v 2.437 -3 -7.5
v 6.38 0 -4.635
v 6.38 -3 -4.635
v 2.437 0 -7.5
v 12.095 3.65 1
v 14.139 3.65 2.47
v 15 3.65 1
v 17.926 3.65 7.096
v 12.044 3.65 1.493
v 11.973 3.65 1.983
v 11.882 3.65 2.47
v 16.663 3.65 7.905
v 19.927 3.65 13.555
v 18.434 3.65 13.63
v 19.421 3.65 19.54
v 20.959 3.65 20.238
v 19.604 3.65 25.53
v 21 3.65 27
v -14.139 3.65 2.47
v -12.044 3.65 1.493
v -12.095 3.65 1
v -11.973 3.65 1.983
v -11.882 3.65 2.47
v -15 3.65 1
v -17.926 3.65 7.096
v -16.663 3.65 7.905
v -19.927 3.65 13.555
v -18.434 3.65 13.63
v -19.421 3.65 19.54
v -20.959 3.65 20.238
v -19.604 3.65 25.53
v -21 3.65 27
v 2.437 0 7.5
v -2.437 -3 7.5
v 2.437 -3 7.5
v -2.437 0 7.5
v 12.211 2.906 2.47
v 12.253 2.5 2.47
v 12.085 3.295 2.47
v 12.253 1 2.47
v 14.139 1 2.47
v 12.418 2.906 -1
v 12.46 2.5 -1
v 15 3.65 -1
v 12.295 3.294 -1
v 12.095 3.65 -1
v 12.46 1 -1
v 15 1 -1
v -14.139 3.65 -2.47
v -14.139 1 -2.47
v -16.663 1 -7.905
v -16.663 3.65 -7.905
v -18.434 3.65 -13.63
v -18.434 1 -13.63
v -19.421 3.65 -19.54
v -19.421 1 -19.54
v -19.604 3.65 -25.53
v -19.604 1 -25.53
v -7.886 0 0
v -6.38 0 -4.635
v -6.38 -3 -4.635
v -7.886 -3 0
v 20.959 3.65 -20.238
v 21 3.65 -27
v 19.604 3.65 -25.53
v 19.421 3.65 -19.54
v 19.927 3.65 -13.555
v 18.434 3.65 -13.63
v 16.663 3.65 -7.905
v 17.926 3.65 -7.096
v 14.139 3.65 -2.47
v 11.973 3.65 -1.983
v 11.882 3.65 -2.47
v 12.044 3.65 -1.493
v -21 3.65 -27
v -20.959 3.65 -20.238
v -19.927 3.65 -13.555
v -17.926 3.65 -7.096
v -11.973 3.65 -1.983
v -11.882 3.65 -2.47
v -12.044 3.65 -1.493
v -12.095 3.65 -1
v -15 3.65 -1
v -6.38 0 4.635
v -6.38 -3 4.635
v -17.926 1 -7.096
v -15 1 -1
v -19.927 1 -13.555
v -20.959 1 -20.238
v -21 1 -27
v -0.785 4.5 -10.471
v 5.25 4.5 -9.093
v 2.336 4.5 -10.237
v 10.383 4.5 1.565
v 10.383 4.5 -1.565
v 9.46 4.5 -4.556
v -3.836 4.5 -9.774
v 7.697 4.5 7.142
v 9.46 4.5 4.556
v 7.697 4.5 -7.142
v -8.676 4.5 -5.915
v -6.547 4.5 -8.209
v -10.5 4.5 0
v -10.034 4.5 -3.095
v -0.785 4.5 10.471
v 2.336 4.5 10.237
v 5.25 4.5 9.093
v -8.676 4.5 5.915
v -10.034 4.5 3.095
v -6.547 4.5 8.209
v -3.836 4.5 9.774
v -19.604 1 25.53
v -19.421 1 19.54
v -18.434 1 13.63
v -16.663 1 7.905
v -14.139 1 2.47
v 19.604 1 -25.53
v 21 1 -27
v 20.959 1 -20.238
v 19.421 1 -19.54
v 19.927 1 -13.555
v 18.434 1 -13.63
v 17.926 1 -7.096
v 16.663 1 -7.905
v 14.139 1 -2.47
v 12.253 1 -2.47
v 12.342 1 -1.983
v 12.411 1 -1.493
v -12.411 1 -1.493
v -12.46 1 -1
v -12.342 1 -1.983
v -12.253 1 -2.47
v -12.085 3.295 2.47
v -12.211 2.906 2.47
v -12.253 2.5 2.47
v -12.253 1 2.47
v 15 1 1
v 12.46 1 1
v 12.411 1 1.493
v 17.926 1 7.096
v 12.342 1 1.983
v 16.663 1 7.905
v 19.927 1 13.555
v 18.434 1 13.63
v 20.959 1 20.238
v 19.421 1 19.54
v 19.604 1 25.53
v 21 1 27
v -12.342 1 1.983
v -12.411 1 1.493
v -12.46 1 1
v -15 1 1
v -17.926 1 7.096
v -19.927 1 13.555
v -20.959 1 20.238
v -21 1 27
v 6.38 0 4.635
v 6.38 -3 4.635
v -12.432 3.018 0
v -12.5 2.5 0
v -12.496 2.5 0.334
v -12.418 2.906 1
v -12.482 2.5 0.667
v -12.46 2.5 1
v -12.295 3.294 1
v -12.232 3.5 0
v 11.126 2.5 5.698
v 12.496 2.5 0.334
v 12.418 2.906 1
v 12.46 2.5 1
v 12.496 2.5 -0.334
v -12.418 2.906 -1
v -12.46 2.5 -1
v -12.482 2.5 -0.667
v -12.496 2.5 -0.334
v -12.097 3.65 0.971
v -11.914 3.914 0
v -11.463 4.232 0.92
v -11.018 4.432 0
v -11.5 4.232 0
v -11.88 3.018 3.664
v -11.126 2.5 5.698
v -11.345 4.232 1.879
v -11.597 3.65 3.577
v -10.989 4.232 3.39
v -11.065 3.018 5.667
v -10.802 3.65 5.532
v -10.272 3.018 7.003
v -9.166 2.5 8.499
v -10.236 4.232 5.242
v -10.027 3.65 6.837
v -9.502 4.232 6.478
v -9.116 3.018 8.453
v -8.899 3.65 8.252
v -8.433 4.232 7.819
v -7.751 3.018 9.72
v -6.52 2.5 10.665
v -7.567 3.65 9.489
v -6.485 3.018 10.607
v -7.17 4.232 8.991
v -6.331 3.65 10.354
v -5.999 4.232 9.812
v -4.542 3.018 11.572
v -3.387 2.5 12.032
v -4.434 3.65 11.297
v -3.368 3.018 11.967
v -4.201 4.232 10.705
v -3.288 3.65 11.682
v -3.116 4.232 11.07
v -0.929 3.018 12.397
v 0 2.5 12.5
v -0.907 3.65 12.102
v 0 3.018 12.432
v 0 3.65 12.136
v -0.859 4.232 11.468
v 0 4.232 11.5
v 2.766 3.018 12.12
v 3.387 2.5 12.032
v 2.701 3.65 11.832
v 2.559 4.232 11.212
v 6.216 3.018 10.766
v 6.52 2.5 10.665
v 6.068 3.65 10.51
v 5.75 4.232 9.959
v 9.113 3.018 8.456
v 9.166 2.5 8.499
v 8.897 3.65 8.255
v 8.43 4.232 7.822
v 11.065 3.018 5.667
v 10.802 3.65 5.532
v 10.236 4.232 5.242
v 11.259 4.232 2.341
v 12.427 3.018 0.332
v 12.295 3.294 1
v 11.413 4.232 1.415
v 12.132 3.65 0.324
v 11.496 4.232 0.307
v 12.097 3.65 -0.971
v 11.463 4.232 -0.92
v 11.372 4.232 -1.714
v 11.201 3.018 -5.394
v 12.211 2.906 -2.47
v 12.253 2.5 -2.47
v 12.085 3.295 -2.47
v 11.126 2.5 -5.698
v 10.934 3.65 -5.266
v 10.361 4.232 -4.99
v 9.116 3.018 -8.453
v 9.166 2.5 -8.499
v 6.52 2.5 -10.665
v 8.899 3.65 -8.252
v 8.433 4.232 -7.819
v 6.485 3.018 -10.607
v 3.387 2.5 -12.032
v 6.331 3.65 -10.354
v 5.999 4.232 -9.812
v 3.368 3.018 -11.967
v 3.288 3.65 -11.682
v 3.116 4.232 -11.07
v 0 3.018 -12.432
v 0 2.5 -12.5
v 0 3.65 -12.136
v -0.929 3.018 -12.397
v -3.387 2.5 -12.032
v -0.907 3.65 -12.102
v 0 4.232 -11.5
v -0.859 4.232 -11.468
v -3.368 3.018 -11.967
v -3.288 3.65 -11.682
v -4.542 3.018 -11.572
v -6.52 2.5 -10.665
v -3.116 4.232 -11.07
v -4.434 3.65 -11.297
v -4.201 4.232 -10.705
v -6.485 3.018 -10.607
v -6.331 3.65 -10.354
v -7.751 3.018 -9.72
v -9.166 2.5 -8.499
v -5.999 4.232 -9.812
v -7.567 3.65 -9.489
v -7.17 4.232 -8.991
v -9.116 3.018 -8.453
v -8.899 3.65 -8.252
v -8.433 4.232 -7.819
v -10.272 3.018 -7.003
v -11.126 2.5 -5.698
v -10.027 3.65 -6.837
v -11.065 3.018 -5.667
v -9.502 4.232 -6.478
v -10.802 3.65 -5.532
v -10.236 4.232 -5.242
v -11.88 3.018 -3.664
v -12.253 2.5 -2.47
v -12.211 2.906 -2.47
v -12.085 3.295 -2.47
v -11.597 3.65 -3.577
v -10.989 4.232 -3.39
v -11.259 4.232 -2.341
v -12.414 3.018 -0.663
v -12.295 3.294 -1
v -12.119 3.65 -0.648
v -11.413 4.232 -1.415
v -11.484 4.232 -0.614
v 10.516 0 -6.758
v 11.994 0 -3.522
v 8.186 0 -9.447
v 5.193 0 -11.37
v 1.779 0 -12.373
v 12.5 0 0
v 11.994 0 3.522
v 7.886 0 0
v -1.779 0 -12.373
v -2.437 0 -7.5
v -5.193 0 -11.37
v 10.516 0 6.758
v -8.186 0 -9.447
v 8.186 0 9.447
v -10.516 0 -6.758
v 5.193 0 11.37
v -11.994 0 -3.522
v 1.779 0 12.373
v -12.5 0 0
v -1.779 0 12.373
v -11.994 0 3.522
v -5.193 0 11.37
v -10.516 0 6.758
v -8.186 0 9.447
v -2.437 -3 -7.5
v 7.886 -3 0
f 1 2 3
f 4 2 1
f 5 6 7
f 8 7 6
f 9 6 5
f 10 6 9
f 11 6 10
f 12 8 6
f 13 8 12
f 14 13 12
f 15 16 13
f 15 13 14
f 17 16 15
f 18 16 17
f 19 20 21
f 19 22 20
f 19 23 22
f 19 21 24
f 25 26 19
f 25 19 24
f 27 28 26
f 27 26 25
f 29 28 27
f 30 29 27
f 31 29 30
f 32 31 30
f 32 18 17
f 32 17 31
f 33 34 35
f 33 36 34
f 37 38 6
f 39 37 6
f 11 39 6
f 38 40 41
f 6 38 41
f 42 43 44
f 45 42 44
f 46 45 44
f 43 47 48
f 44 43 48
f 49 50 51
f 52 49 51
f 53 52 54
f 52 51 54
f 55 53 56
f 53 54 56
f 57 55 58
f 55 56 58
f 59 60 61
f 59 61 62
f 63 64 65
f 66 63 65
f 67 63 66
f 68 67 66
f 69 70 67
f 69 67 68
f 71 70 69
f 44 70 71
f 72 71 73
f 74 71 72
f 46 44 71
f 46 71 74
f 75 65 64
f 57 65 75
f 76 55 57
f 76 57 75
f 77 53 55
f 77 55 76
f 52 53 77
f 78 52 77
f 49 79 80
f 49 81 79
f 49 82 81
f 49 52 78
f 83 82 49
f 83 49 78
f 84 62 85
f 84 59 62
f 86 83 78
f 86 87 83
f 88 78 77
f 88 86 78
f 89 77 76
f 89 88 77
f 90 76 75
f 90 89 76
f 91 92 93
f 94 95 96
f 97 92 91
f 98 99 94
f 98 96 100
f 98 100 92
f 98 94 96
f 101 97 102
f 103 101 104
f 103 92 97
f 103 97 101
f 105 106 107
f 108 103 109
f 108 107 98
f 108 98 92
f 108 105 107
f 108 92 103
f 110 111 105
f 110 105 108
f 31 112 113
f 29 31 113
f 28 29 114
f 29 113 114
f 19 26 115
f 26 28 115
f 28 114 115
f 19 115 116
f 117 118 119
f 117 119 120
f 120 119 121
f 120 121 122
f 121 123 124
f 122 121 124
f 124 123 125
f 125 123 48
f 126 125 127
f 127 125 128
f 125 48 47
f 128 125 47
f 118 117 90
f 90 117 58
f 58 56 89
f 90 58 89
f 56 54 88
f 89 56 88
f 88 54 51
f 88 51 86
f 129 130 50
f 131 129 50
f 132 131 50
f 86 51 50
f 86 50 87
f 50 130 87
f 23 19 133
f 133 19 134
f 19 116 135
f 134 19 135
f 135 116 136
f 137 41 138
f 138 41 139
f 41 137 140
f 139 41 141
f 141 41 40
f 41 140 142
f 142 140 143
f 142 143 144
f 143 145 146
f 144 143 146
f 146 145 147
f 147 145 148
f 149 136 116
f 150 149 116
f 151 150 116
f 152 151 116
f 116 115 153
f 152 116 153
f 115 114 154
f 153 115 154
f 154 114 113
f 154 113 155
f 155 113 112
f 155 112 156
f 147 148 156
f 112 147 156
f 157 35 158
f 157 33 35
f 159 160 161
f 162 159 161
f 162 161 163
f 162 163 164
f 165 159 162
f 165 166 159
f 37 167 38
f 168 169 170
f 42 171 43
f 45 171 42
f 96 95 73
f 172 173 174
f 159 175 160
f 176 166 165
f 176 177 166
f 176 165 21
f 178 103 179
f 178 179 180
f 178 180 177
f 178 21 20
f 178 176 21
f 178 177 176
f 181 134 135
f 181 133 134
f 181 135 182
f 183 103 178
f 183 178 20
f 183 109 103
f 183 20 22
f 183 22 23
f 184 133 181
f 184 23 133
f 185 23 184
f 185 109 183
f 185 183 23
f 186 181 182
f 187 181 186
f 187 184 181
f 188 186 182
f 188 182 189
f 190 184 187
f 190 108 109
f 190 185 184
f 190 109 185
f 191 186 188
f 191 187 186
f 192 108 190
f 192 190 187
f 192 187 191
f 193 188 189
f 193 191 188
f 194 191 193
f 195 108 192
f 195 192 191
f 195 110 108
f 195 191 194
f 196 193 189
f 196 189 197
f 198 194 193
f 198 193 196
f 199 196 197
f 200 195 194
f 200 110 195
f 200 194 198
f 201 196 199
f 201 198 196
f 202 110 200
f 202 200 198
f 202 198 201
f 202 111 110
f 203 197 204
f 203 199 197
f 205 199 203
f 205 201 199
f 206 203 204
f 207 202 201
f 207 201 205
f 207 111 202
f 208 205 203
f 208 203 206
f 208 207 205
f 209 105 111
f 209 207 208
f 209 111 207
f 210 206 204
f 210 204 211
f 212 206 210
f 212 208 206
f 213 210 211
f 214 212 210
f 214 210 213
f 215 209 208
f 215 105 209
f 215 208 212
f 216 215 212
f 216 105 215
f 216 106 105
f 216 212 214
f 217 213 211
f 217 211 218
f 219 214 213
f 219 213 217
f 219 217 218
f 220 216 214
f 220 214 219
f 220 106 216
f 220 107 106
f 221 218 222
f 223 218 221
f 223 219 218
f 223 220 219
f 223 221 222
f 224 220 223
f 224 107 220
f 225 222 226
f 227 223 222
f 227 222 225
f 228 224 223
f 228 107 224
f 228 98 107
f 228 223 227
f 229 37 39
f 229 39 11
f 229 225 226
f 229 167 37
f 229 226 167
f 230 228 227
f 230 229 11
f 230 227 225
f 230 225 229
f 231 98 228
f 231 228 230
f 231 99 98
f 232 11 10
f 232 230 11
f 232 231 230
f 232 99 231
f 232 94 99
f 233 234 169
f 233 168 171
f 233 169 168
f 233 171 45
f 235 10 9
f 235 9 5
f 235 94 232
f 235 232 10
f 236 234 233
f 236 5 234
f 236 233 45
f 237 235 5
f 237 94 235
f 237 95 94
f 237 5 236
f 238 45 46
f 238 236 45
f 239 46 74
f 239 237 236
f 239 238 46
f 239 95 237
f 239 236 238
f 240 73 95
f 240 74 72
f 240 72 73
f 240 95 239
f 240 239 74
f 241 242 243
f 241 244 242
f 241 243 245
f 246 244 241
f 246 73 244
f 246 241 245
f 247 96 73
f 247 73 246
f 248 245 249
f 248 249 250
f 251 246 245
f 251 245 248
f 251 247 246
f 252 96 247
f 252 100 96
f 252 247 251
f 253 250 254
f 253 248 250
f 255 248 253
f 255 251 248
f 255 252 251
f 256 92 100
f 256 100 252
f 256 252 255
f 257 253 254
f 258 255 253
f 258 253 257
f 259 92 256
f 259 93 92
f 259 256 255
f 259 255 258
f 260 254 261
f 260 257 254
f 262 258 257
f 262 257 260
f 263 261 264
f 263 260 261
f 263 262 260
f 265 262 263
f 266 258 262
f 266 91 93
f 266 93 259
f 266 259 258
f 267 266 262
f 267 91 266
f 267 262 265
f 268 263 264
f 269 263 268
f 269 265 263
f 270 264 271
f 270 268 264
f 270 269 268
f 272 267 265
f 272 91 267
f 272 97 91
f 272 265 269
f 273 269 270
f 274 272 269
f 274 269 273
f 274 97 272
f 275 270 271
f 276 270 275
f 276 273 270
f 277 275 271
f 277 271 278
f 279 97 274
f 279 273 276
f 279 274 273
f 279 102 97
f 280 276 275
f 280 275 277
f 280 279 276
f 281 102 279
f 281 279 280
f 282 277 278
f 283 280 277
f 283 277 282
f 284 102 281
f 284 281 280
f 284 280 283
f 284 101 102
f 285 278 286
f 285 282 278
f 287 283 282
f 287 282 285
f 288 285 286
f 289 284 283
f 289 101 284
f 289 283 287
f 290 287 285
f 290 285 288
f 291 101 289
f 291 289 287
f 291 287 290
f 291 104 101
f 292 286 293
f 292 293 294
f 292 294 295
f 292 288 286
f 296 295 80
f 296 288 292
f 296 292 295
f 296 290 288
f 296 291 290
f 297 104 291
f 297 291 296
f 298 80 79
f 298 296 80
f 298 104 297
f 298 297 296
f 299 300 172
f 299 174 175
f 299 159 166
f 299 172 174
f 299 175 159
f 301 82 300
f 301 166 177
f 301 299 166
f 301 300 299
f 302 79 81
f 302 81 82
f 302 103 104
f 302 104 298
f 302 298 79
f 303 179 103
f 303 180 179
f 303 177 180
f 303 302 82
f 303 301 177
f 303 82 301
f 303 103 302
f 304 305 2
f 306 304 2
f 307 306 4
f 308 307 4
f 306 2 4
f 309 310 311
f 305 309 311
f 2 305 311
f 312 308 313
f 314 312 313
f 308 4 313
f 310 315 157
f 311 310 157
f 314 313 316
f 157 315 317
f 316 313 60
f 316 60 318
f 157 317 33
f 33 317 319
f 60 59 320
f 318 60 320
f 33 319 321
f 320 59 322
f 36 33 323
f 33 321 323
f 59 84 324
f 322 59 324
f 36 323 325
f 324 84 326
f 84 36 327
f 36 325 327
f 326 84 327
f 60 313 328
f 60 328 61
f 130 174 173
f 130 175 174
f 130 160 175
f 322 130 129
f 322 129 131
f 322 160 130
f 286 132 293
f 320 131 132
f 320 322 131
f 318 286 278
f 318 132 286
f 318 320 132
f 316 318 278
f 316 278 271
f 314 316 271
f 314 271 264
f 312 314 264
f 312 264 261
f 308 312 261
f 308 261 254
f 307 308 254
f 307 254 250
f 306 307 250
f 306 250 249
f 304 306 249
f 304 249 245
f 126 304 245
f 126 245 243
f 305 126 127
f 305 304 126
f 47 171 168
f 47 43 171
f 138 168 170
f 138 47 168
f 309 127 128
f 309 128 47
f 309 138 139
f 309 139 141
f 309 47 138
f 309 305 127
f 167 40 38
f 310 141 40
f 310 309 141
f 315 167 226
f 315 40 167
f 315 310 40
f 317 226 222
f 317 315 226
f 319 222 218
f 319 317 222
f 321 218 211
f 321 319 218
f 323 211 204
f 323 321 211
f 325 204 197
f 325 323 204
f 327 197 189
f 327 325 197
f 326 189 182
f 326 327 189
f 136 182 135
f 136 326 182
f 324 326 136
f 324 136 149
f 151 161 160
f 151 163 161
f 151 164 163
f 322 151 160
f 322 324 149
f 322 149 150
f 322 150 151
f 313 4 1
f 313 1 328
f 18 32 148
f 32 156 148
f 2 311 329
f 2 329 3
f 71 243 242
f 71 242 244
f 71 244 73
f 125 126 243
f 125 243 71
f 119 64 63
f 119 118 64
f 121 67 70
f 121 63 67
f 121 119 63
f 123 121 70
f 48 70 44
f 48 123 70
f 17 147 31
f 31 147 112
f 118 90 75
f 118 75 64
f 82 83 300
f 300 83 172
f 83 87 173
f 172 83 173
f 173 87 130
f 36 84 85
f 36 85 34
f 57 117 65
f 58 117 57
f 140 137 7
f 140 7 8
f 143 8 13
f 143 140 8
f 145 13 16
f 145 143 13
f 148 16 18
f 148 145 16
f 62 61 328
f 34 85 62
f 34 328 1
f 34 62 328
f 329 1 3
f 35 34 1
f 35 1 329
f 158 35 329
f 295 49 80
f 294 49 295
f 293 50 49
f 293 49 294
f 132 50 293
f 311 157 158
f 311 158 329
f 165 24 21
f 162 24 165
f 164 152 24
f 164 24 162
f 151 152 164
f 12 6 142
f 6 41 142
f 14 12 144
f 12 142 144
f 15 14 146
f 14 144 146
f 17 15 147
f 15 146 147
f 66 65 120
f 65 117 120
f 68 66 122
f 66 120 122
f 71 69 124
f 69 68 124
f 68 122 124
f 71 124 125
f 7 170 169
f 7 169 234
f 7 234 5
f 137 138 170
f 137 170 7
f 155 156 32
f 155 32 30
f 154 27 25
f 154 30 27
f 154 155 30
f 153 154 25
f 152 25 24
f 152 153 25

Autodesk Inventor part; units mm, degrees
ref_plane "YZ Plane" through (0, 0, 0) normal (1, 0, 0) x (0, 1, 0)
ref_plane "XY Plane" through (0, 0, 0) normal (0, 0, 1) x (1, 0, 0)
sketch "Sketch1" plane through (0, 0, 0) normal (0, 1, 0) x (-1, 0, 0)
  circle A0 centre (0, 0) radius 12.5
  dimension "d0" = 25
extrude "Extrusion1" add sketch "Sketch1" along normal blind 4.5
ref_plane "Work Plane1" through (0, 1, 0) normal (0, 1, 0) x (-1, 0, 0)
sketch "Sketch2" plane through (0, 1, 0) normal (0, 1, 0) x (-1, 0, 0)
  line L0 (15, -1) -> (-15, -1)
  arc A0 (21, -27) -> (15, -1) centre (-24.8954, -23.8989) ccw
  line L1 (21, -27) -> (-21, -27)
  arc A1 (-15, -1) -> (-21, -27) centre (24.8954, -23.8989) ccw
  line L2 (-19.6045, -25.5298) -> (19.6045, -25.5298)
  arc A2 (19.6045, -25.5298) -> (14.1394, -2.4702) centre (-24.8954, -23.8989) ccw
  line L3 (14.1394, -2.4702) -> (-14.1394, -2.4702)
  arc A3 (-14.1394, -2.4702) -> (-19.6045, -25.5298) centre (24.8954, -23.8989) ccw
  line L4 (31.9342, 0) -> (-23.3502, 0) construction
  line L5 (15, 1) -> (-15, 1)
  arc A4 (15, 1) -> (21, 27) centre (-24.8954, 23.8989) ccw
  line L6 (21, 27) -> (-21, 27)
  arc A5 (-21, 27) -> (-15, 1) centre (24.8954, 23.8989) ccw
  line L7 (-19.6045, 25.5298) -> (19.6045, 25.5298)
  arc A6 (14.1394, 2.4702) -> (19.6045, 25.5298) centre (-24.8954, 23.8989) ccw
  line L8 (14.1394, 2.4702) -> (-14.1394, 2.4702)
  arc A7 (-19.6045, 25.5298) -> (-14.1394, 2.4702) centre (24.8954, 23.8989) ccw
  point P0 (0, 0)
  point P1 (0, -1)
  point P2 (0, -27)
  point P3 (0, 1)
  point P4 (0, 27)
  dimension "d4" = 1
  dimension "d5" = 30
  dimension "d6" = 26
  dimension "d7" = 42
  dimension "d8" = 46
  dimension "d9" = 46
extrude "Extrusion2" add sketch "Sketch2" along normal blind 2.65
fillet "Fillet1" radius 2 1 edges at (12.5, 4.5, 0)
sketch "Sketch3" plane through (0, 0, 0) normal (0, -1, 0) x (1, 0, 0)
  line L0 (-7.886, 0) -> (-6.3799, 4.6353)
  line L1 (-6.3799, 4.6353) -> (-2.4369, 7.5)
  line L2 (-2.4369, 7.5) -> (2.4369, 7.5)
  line L3 (2.4369, 7.5) -> (6.3799, 4.6353)
  line L4 (6.3799, 4.6353) -> (7.886, 0)
  line L5 (7.886, 0) -> (6.3799, -4.6353)
  line L6 (6.3799, -4.6353) -> (2.4369, -7.5)
  line L7 (2.4369, -7.5) -> (-2.4369, -7.5)
  line L8 (-2.4369, -7.5) -> (-6.3799, -4.6353)
  line L9 (-6.3799, -4.6353) -> (-7.886, 0)
  point P0 (0, 0)
  point P1 (0, 0)
  point P2 (0, -7.5)
  dimension "d13" = 15
extrude "Extrusion3" add sketch "Sketch3" along normal blind 3
properties part number "brace_tabs"
